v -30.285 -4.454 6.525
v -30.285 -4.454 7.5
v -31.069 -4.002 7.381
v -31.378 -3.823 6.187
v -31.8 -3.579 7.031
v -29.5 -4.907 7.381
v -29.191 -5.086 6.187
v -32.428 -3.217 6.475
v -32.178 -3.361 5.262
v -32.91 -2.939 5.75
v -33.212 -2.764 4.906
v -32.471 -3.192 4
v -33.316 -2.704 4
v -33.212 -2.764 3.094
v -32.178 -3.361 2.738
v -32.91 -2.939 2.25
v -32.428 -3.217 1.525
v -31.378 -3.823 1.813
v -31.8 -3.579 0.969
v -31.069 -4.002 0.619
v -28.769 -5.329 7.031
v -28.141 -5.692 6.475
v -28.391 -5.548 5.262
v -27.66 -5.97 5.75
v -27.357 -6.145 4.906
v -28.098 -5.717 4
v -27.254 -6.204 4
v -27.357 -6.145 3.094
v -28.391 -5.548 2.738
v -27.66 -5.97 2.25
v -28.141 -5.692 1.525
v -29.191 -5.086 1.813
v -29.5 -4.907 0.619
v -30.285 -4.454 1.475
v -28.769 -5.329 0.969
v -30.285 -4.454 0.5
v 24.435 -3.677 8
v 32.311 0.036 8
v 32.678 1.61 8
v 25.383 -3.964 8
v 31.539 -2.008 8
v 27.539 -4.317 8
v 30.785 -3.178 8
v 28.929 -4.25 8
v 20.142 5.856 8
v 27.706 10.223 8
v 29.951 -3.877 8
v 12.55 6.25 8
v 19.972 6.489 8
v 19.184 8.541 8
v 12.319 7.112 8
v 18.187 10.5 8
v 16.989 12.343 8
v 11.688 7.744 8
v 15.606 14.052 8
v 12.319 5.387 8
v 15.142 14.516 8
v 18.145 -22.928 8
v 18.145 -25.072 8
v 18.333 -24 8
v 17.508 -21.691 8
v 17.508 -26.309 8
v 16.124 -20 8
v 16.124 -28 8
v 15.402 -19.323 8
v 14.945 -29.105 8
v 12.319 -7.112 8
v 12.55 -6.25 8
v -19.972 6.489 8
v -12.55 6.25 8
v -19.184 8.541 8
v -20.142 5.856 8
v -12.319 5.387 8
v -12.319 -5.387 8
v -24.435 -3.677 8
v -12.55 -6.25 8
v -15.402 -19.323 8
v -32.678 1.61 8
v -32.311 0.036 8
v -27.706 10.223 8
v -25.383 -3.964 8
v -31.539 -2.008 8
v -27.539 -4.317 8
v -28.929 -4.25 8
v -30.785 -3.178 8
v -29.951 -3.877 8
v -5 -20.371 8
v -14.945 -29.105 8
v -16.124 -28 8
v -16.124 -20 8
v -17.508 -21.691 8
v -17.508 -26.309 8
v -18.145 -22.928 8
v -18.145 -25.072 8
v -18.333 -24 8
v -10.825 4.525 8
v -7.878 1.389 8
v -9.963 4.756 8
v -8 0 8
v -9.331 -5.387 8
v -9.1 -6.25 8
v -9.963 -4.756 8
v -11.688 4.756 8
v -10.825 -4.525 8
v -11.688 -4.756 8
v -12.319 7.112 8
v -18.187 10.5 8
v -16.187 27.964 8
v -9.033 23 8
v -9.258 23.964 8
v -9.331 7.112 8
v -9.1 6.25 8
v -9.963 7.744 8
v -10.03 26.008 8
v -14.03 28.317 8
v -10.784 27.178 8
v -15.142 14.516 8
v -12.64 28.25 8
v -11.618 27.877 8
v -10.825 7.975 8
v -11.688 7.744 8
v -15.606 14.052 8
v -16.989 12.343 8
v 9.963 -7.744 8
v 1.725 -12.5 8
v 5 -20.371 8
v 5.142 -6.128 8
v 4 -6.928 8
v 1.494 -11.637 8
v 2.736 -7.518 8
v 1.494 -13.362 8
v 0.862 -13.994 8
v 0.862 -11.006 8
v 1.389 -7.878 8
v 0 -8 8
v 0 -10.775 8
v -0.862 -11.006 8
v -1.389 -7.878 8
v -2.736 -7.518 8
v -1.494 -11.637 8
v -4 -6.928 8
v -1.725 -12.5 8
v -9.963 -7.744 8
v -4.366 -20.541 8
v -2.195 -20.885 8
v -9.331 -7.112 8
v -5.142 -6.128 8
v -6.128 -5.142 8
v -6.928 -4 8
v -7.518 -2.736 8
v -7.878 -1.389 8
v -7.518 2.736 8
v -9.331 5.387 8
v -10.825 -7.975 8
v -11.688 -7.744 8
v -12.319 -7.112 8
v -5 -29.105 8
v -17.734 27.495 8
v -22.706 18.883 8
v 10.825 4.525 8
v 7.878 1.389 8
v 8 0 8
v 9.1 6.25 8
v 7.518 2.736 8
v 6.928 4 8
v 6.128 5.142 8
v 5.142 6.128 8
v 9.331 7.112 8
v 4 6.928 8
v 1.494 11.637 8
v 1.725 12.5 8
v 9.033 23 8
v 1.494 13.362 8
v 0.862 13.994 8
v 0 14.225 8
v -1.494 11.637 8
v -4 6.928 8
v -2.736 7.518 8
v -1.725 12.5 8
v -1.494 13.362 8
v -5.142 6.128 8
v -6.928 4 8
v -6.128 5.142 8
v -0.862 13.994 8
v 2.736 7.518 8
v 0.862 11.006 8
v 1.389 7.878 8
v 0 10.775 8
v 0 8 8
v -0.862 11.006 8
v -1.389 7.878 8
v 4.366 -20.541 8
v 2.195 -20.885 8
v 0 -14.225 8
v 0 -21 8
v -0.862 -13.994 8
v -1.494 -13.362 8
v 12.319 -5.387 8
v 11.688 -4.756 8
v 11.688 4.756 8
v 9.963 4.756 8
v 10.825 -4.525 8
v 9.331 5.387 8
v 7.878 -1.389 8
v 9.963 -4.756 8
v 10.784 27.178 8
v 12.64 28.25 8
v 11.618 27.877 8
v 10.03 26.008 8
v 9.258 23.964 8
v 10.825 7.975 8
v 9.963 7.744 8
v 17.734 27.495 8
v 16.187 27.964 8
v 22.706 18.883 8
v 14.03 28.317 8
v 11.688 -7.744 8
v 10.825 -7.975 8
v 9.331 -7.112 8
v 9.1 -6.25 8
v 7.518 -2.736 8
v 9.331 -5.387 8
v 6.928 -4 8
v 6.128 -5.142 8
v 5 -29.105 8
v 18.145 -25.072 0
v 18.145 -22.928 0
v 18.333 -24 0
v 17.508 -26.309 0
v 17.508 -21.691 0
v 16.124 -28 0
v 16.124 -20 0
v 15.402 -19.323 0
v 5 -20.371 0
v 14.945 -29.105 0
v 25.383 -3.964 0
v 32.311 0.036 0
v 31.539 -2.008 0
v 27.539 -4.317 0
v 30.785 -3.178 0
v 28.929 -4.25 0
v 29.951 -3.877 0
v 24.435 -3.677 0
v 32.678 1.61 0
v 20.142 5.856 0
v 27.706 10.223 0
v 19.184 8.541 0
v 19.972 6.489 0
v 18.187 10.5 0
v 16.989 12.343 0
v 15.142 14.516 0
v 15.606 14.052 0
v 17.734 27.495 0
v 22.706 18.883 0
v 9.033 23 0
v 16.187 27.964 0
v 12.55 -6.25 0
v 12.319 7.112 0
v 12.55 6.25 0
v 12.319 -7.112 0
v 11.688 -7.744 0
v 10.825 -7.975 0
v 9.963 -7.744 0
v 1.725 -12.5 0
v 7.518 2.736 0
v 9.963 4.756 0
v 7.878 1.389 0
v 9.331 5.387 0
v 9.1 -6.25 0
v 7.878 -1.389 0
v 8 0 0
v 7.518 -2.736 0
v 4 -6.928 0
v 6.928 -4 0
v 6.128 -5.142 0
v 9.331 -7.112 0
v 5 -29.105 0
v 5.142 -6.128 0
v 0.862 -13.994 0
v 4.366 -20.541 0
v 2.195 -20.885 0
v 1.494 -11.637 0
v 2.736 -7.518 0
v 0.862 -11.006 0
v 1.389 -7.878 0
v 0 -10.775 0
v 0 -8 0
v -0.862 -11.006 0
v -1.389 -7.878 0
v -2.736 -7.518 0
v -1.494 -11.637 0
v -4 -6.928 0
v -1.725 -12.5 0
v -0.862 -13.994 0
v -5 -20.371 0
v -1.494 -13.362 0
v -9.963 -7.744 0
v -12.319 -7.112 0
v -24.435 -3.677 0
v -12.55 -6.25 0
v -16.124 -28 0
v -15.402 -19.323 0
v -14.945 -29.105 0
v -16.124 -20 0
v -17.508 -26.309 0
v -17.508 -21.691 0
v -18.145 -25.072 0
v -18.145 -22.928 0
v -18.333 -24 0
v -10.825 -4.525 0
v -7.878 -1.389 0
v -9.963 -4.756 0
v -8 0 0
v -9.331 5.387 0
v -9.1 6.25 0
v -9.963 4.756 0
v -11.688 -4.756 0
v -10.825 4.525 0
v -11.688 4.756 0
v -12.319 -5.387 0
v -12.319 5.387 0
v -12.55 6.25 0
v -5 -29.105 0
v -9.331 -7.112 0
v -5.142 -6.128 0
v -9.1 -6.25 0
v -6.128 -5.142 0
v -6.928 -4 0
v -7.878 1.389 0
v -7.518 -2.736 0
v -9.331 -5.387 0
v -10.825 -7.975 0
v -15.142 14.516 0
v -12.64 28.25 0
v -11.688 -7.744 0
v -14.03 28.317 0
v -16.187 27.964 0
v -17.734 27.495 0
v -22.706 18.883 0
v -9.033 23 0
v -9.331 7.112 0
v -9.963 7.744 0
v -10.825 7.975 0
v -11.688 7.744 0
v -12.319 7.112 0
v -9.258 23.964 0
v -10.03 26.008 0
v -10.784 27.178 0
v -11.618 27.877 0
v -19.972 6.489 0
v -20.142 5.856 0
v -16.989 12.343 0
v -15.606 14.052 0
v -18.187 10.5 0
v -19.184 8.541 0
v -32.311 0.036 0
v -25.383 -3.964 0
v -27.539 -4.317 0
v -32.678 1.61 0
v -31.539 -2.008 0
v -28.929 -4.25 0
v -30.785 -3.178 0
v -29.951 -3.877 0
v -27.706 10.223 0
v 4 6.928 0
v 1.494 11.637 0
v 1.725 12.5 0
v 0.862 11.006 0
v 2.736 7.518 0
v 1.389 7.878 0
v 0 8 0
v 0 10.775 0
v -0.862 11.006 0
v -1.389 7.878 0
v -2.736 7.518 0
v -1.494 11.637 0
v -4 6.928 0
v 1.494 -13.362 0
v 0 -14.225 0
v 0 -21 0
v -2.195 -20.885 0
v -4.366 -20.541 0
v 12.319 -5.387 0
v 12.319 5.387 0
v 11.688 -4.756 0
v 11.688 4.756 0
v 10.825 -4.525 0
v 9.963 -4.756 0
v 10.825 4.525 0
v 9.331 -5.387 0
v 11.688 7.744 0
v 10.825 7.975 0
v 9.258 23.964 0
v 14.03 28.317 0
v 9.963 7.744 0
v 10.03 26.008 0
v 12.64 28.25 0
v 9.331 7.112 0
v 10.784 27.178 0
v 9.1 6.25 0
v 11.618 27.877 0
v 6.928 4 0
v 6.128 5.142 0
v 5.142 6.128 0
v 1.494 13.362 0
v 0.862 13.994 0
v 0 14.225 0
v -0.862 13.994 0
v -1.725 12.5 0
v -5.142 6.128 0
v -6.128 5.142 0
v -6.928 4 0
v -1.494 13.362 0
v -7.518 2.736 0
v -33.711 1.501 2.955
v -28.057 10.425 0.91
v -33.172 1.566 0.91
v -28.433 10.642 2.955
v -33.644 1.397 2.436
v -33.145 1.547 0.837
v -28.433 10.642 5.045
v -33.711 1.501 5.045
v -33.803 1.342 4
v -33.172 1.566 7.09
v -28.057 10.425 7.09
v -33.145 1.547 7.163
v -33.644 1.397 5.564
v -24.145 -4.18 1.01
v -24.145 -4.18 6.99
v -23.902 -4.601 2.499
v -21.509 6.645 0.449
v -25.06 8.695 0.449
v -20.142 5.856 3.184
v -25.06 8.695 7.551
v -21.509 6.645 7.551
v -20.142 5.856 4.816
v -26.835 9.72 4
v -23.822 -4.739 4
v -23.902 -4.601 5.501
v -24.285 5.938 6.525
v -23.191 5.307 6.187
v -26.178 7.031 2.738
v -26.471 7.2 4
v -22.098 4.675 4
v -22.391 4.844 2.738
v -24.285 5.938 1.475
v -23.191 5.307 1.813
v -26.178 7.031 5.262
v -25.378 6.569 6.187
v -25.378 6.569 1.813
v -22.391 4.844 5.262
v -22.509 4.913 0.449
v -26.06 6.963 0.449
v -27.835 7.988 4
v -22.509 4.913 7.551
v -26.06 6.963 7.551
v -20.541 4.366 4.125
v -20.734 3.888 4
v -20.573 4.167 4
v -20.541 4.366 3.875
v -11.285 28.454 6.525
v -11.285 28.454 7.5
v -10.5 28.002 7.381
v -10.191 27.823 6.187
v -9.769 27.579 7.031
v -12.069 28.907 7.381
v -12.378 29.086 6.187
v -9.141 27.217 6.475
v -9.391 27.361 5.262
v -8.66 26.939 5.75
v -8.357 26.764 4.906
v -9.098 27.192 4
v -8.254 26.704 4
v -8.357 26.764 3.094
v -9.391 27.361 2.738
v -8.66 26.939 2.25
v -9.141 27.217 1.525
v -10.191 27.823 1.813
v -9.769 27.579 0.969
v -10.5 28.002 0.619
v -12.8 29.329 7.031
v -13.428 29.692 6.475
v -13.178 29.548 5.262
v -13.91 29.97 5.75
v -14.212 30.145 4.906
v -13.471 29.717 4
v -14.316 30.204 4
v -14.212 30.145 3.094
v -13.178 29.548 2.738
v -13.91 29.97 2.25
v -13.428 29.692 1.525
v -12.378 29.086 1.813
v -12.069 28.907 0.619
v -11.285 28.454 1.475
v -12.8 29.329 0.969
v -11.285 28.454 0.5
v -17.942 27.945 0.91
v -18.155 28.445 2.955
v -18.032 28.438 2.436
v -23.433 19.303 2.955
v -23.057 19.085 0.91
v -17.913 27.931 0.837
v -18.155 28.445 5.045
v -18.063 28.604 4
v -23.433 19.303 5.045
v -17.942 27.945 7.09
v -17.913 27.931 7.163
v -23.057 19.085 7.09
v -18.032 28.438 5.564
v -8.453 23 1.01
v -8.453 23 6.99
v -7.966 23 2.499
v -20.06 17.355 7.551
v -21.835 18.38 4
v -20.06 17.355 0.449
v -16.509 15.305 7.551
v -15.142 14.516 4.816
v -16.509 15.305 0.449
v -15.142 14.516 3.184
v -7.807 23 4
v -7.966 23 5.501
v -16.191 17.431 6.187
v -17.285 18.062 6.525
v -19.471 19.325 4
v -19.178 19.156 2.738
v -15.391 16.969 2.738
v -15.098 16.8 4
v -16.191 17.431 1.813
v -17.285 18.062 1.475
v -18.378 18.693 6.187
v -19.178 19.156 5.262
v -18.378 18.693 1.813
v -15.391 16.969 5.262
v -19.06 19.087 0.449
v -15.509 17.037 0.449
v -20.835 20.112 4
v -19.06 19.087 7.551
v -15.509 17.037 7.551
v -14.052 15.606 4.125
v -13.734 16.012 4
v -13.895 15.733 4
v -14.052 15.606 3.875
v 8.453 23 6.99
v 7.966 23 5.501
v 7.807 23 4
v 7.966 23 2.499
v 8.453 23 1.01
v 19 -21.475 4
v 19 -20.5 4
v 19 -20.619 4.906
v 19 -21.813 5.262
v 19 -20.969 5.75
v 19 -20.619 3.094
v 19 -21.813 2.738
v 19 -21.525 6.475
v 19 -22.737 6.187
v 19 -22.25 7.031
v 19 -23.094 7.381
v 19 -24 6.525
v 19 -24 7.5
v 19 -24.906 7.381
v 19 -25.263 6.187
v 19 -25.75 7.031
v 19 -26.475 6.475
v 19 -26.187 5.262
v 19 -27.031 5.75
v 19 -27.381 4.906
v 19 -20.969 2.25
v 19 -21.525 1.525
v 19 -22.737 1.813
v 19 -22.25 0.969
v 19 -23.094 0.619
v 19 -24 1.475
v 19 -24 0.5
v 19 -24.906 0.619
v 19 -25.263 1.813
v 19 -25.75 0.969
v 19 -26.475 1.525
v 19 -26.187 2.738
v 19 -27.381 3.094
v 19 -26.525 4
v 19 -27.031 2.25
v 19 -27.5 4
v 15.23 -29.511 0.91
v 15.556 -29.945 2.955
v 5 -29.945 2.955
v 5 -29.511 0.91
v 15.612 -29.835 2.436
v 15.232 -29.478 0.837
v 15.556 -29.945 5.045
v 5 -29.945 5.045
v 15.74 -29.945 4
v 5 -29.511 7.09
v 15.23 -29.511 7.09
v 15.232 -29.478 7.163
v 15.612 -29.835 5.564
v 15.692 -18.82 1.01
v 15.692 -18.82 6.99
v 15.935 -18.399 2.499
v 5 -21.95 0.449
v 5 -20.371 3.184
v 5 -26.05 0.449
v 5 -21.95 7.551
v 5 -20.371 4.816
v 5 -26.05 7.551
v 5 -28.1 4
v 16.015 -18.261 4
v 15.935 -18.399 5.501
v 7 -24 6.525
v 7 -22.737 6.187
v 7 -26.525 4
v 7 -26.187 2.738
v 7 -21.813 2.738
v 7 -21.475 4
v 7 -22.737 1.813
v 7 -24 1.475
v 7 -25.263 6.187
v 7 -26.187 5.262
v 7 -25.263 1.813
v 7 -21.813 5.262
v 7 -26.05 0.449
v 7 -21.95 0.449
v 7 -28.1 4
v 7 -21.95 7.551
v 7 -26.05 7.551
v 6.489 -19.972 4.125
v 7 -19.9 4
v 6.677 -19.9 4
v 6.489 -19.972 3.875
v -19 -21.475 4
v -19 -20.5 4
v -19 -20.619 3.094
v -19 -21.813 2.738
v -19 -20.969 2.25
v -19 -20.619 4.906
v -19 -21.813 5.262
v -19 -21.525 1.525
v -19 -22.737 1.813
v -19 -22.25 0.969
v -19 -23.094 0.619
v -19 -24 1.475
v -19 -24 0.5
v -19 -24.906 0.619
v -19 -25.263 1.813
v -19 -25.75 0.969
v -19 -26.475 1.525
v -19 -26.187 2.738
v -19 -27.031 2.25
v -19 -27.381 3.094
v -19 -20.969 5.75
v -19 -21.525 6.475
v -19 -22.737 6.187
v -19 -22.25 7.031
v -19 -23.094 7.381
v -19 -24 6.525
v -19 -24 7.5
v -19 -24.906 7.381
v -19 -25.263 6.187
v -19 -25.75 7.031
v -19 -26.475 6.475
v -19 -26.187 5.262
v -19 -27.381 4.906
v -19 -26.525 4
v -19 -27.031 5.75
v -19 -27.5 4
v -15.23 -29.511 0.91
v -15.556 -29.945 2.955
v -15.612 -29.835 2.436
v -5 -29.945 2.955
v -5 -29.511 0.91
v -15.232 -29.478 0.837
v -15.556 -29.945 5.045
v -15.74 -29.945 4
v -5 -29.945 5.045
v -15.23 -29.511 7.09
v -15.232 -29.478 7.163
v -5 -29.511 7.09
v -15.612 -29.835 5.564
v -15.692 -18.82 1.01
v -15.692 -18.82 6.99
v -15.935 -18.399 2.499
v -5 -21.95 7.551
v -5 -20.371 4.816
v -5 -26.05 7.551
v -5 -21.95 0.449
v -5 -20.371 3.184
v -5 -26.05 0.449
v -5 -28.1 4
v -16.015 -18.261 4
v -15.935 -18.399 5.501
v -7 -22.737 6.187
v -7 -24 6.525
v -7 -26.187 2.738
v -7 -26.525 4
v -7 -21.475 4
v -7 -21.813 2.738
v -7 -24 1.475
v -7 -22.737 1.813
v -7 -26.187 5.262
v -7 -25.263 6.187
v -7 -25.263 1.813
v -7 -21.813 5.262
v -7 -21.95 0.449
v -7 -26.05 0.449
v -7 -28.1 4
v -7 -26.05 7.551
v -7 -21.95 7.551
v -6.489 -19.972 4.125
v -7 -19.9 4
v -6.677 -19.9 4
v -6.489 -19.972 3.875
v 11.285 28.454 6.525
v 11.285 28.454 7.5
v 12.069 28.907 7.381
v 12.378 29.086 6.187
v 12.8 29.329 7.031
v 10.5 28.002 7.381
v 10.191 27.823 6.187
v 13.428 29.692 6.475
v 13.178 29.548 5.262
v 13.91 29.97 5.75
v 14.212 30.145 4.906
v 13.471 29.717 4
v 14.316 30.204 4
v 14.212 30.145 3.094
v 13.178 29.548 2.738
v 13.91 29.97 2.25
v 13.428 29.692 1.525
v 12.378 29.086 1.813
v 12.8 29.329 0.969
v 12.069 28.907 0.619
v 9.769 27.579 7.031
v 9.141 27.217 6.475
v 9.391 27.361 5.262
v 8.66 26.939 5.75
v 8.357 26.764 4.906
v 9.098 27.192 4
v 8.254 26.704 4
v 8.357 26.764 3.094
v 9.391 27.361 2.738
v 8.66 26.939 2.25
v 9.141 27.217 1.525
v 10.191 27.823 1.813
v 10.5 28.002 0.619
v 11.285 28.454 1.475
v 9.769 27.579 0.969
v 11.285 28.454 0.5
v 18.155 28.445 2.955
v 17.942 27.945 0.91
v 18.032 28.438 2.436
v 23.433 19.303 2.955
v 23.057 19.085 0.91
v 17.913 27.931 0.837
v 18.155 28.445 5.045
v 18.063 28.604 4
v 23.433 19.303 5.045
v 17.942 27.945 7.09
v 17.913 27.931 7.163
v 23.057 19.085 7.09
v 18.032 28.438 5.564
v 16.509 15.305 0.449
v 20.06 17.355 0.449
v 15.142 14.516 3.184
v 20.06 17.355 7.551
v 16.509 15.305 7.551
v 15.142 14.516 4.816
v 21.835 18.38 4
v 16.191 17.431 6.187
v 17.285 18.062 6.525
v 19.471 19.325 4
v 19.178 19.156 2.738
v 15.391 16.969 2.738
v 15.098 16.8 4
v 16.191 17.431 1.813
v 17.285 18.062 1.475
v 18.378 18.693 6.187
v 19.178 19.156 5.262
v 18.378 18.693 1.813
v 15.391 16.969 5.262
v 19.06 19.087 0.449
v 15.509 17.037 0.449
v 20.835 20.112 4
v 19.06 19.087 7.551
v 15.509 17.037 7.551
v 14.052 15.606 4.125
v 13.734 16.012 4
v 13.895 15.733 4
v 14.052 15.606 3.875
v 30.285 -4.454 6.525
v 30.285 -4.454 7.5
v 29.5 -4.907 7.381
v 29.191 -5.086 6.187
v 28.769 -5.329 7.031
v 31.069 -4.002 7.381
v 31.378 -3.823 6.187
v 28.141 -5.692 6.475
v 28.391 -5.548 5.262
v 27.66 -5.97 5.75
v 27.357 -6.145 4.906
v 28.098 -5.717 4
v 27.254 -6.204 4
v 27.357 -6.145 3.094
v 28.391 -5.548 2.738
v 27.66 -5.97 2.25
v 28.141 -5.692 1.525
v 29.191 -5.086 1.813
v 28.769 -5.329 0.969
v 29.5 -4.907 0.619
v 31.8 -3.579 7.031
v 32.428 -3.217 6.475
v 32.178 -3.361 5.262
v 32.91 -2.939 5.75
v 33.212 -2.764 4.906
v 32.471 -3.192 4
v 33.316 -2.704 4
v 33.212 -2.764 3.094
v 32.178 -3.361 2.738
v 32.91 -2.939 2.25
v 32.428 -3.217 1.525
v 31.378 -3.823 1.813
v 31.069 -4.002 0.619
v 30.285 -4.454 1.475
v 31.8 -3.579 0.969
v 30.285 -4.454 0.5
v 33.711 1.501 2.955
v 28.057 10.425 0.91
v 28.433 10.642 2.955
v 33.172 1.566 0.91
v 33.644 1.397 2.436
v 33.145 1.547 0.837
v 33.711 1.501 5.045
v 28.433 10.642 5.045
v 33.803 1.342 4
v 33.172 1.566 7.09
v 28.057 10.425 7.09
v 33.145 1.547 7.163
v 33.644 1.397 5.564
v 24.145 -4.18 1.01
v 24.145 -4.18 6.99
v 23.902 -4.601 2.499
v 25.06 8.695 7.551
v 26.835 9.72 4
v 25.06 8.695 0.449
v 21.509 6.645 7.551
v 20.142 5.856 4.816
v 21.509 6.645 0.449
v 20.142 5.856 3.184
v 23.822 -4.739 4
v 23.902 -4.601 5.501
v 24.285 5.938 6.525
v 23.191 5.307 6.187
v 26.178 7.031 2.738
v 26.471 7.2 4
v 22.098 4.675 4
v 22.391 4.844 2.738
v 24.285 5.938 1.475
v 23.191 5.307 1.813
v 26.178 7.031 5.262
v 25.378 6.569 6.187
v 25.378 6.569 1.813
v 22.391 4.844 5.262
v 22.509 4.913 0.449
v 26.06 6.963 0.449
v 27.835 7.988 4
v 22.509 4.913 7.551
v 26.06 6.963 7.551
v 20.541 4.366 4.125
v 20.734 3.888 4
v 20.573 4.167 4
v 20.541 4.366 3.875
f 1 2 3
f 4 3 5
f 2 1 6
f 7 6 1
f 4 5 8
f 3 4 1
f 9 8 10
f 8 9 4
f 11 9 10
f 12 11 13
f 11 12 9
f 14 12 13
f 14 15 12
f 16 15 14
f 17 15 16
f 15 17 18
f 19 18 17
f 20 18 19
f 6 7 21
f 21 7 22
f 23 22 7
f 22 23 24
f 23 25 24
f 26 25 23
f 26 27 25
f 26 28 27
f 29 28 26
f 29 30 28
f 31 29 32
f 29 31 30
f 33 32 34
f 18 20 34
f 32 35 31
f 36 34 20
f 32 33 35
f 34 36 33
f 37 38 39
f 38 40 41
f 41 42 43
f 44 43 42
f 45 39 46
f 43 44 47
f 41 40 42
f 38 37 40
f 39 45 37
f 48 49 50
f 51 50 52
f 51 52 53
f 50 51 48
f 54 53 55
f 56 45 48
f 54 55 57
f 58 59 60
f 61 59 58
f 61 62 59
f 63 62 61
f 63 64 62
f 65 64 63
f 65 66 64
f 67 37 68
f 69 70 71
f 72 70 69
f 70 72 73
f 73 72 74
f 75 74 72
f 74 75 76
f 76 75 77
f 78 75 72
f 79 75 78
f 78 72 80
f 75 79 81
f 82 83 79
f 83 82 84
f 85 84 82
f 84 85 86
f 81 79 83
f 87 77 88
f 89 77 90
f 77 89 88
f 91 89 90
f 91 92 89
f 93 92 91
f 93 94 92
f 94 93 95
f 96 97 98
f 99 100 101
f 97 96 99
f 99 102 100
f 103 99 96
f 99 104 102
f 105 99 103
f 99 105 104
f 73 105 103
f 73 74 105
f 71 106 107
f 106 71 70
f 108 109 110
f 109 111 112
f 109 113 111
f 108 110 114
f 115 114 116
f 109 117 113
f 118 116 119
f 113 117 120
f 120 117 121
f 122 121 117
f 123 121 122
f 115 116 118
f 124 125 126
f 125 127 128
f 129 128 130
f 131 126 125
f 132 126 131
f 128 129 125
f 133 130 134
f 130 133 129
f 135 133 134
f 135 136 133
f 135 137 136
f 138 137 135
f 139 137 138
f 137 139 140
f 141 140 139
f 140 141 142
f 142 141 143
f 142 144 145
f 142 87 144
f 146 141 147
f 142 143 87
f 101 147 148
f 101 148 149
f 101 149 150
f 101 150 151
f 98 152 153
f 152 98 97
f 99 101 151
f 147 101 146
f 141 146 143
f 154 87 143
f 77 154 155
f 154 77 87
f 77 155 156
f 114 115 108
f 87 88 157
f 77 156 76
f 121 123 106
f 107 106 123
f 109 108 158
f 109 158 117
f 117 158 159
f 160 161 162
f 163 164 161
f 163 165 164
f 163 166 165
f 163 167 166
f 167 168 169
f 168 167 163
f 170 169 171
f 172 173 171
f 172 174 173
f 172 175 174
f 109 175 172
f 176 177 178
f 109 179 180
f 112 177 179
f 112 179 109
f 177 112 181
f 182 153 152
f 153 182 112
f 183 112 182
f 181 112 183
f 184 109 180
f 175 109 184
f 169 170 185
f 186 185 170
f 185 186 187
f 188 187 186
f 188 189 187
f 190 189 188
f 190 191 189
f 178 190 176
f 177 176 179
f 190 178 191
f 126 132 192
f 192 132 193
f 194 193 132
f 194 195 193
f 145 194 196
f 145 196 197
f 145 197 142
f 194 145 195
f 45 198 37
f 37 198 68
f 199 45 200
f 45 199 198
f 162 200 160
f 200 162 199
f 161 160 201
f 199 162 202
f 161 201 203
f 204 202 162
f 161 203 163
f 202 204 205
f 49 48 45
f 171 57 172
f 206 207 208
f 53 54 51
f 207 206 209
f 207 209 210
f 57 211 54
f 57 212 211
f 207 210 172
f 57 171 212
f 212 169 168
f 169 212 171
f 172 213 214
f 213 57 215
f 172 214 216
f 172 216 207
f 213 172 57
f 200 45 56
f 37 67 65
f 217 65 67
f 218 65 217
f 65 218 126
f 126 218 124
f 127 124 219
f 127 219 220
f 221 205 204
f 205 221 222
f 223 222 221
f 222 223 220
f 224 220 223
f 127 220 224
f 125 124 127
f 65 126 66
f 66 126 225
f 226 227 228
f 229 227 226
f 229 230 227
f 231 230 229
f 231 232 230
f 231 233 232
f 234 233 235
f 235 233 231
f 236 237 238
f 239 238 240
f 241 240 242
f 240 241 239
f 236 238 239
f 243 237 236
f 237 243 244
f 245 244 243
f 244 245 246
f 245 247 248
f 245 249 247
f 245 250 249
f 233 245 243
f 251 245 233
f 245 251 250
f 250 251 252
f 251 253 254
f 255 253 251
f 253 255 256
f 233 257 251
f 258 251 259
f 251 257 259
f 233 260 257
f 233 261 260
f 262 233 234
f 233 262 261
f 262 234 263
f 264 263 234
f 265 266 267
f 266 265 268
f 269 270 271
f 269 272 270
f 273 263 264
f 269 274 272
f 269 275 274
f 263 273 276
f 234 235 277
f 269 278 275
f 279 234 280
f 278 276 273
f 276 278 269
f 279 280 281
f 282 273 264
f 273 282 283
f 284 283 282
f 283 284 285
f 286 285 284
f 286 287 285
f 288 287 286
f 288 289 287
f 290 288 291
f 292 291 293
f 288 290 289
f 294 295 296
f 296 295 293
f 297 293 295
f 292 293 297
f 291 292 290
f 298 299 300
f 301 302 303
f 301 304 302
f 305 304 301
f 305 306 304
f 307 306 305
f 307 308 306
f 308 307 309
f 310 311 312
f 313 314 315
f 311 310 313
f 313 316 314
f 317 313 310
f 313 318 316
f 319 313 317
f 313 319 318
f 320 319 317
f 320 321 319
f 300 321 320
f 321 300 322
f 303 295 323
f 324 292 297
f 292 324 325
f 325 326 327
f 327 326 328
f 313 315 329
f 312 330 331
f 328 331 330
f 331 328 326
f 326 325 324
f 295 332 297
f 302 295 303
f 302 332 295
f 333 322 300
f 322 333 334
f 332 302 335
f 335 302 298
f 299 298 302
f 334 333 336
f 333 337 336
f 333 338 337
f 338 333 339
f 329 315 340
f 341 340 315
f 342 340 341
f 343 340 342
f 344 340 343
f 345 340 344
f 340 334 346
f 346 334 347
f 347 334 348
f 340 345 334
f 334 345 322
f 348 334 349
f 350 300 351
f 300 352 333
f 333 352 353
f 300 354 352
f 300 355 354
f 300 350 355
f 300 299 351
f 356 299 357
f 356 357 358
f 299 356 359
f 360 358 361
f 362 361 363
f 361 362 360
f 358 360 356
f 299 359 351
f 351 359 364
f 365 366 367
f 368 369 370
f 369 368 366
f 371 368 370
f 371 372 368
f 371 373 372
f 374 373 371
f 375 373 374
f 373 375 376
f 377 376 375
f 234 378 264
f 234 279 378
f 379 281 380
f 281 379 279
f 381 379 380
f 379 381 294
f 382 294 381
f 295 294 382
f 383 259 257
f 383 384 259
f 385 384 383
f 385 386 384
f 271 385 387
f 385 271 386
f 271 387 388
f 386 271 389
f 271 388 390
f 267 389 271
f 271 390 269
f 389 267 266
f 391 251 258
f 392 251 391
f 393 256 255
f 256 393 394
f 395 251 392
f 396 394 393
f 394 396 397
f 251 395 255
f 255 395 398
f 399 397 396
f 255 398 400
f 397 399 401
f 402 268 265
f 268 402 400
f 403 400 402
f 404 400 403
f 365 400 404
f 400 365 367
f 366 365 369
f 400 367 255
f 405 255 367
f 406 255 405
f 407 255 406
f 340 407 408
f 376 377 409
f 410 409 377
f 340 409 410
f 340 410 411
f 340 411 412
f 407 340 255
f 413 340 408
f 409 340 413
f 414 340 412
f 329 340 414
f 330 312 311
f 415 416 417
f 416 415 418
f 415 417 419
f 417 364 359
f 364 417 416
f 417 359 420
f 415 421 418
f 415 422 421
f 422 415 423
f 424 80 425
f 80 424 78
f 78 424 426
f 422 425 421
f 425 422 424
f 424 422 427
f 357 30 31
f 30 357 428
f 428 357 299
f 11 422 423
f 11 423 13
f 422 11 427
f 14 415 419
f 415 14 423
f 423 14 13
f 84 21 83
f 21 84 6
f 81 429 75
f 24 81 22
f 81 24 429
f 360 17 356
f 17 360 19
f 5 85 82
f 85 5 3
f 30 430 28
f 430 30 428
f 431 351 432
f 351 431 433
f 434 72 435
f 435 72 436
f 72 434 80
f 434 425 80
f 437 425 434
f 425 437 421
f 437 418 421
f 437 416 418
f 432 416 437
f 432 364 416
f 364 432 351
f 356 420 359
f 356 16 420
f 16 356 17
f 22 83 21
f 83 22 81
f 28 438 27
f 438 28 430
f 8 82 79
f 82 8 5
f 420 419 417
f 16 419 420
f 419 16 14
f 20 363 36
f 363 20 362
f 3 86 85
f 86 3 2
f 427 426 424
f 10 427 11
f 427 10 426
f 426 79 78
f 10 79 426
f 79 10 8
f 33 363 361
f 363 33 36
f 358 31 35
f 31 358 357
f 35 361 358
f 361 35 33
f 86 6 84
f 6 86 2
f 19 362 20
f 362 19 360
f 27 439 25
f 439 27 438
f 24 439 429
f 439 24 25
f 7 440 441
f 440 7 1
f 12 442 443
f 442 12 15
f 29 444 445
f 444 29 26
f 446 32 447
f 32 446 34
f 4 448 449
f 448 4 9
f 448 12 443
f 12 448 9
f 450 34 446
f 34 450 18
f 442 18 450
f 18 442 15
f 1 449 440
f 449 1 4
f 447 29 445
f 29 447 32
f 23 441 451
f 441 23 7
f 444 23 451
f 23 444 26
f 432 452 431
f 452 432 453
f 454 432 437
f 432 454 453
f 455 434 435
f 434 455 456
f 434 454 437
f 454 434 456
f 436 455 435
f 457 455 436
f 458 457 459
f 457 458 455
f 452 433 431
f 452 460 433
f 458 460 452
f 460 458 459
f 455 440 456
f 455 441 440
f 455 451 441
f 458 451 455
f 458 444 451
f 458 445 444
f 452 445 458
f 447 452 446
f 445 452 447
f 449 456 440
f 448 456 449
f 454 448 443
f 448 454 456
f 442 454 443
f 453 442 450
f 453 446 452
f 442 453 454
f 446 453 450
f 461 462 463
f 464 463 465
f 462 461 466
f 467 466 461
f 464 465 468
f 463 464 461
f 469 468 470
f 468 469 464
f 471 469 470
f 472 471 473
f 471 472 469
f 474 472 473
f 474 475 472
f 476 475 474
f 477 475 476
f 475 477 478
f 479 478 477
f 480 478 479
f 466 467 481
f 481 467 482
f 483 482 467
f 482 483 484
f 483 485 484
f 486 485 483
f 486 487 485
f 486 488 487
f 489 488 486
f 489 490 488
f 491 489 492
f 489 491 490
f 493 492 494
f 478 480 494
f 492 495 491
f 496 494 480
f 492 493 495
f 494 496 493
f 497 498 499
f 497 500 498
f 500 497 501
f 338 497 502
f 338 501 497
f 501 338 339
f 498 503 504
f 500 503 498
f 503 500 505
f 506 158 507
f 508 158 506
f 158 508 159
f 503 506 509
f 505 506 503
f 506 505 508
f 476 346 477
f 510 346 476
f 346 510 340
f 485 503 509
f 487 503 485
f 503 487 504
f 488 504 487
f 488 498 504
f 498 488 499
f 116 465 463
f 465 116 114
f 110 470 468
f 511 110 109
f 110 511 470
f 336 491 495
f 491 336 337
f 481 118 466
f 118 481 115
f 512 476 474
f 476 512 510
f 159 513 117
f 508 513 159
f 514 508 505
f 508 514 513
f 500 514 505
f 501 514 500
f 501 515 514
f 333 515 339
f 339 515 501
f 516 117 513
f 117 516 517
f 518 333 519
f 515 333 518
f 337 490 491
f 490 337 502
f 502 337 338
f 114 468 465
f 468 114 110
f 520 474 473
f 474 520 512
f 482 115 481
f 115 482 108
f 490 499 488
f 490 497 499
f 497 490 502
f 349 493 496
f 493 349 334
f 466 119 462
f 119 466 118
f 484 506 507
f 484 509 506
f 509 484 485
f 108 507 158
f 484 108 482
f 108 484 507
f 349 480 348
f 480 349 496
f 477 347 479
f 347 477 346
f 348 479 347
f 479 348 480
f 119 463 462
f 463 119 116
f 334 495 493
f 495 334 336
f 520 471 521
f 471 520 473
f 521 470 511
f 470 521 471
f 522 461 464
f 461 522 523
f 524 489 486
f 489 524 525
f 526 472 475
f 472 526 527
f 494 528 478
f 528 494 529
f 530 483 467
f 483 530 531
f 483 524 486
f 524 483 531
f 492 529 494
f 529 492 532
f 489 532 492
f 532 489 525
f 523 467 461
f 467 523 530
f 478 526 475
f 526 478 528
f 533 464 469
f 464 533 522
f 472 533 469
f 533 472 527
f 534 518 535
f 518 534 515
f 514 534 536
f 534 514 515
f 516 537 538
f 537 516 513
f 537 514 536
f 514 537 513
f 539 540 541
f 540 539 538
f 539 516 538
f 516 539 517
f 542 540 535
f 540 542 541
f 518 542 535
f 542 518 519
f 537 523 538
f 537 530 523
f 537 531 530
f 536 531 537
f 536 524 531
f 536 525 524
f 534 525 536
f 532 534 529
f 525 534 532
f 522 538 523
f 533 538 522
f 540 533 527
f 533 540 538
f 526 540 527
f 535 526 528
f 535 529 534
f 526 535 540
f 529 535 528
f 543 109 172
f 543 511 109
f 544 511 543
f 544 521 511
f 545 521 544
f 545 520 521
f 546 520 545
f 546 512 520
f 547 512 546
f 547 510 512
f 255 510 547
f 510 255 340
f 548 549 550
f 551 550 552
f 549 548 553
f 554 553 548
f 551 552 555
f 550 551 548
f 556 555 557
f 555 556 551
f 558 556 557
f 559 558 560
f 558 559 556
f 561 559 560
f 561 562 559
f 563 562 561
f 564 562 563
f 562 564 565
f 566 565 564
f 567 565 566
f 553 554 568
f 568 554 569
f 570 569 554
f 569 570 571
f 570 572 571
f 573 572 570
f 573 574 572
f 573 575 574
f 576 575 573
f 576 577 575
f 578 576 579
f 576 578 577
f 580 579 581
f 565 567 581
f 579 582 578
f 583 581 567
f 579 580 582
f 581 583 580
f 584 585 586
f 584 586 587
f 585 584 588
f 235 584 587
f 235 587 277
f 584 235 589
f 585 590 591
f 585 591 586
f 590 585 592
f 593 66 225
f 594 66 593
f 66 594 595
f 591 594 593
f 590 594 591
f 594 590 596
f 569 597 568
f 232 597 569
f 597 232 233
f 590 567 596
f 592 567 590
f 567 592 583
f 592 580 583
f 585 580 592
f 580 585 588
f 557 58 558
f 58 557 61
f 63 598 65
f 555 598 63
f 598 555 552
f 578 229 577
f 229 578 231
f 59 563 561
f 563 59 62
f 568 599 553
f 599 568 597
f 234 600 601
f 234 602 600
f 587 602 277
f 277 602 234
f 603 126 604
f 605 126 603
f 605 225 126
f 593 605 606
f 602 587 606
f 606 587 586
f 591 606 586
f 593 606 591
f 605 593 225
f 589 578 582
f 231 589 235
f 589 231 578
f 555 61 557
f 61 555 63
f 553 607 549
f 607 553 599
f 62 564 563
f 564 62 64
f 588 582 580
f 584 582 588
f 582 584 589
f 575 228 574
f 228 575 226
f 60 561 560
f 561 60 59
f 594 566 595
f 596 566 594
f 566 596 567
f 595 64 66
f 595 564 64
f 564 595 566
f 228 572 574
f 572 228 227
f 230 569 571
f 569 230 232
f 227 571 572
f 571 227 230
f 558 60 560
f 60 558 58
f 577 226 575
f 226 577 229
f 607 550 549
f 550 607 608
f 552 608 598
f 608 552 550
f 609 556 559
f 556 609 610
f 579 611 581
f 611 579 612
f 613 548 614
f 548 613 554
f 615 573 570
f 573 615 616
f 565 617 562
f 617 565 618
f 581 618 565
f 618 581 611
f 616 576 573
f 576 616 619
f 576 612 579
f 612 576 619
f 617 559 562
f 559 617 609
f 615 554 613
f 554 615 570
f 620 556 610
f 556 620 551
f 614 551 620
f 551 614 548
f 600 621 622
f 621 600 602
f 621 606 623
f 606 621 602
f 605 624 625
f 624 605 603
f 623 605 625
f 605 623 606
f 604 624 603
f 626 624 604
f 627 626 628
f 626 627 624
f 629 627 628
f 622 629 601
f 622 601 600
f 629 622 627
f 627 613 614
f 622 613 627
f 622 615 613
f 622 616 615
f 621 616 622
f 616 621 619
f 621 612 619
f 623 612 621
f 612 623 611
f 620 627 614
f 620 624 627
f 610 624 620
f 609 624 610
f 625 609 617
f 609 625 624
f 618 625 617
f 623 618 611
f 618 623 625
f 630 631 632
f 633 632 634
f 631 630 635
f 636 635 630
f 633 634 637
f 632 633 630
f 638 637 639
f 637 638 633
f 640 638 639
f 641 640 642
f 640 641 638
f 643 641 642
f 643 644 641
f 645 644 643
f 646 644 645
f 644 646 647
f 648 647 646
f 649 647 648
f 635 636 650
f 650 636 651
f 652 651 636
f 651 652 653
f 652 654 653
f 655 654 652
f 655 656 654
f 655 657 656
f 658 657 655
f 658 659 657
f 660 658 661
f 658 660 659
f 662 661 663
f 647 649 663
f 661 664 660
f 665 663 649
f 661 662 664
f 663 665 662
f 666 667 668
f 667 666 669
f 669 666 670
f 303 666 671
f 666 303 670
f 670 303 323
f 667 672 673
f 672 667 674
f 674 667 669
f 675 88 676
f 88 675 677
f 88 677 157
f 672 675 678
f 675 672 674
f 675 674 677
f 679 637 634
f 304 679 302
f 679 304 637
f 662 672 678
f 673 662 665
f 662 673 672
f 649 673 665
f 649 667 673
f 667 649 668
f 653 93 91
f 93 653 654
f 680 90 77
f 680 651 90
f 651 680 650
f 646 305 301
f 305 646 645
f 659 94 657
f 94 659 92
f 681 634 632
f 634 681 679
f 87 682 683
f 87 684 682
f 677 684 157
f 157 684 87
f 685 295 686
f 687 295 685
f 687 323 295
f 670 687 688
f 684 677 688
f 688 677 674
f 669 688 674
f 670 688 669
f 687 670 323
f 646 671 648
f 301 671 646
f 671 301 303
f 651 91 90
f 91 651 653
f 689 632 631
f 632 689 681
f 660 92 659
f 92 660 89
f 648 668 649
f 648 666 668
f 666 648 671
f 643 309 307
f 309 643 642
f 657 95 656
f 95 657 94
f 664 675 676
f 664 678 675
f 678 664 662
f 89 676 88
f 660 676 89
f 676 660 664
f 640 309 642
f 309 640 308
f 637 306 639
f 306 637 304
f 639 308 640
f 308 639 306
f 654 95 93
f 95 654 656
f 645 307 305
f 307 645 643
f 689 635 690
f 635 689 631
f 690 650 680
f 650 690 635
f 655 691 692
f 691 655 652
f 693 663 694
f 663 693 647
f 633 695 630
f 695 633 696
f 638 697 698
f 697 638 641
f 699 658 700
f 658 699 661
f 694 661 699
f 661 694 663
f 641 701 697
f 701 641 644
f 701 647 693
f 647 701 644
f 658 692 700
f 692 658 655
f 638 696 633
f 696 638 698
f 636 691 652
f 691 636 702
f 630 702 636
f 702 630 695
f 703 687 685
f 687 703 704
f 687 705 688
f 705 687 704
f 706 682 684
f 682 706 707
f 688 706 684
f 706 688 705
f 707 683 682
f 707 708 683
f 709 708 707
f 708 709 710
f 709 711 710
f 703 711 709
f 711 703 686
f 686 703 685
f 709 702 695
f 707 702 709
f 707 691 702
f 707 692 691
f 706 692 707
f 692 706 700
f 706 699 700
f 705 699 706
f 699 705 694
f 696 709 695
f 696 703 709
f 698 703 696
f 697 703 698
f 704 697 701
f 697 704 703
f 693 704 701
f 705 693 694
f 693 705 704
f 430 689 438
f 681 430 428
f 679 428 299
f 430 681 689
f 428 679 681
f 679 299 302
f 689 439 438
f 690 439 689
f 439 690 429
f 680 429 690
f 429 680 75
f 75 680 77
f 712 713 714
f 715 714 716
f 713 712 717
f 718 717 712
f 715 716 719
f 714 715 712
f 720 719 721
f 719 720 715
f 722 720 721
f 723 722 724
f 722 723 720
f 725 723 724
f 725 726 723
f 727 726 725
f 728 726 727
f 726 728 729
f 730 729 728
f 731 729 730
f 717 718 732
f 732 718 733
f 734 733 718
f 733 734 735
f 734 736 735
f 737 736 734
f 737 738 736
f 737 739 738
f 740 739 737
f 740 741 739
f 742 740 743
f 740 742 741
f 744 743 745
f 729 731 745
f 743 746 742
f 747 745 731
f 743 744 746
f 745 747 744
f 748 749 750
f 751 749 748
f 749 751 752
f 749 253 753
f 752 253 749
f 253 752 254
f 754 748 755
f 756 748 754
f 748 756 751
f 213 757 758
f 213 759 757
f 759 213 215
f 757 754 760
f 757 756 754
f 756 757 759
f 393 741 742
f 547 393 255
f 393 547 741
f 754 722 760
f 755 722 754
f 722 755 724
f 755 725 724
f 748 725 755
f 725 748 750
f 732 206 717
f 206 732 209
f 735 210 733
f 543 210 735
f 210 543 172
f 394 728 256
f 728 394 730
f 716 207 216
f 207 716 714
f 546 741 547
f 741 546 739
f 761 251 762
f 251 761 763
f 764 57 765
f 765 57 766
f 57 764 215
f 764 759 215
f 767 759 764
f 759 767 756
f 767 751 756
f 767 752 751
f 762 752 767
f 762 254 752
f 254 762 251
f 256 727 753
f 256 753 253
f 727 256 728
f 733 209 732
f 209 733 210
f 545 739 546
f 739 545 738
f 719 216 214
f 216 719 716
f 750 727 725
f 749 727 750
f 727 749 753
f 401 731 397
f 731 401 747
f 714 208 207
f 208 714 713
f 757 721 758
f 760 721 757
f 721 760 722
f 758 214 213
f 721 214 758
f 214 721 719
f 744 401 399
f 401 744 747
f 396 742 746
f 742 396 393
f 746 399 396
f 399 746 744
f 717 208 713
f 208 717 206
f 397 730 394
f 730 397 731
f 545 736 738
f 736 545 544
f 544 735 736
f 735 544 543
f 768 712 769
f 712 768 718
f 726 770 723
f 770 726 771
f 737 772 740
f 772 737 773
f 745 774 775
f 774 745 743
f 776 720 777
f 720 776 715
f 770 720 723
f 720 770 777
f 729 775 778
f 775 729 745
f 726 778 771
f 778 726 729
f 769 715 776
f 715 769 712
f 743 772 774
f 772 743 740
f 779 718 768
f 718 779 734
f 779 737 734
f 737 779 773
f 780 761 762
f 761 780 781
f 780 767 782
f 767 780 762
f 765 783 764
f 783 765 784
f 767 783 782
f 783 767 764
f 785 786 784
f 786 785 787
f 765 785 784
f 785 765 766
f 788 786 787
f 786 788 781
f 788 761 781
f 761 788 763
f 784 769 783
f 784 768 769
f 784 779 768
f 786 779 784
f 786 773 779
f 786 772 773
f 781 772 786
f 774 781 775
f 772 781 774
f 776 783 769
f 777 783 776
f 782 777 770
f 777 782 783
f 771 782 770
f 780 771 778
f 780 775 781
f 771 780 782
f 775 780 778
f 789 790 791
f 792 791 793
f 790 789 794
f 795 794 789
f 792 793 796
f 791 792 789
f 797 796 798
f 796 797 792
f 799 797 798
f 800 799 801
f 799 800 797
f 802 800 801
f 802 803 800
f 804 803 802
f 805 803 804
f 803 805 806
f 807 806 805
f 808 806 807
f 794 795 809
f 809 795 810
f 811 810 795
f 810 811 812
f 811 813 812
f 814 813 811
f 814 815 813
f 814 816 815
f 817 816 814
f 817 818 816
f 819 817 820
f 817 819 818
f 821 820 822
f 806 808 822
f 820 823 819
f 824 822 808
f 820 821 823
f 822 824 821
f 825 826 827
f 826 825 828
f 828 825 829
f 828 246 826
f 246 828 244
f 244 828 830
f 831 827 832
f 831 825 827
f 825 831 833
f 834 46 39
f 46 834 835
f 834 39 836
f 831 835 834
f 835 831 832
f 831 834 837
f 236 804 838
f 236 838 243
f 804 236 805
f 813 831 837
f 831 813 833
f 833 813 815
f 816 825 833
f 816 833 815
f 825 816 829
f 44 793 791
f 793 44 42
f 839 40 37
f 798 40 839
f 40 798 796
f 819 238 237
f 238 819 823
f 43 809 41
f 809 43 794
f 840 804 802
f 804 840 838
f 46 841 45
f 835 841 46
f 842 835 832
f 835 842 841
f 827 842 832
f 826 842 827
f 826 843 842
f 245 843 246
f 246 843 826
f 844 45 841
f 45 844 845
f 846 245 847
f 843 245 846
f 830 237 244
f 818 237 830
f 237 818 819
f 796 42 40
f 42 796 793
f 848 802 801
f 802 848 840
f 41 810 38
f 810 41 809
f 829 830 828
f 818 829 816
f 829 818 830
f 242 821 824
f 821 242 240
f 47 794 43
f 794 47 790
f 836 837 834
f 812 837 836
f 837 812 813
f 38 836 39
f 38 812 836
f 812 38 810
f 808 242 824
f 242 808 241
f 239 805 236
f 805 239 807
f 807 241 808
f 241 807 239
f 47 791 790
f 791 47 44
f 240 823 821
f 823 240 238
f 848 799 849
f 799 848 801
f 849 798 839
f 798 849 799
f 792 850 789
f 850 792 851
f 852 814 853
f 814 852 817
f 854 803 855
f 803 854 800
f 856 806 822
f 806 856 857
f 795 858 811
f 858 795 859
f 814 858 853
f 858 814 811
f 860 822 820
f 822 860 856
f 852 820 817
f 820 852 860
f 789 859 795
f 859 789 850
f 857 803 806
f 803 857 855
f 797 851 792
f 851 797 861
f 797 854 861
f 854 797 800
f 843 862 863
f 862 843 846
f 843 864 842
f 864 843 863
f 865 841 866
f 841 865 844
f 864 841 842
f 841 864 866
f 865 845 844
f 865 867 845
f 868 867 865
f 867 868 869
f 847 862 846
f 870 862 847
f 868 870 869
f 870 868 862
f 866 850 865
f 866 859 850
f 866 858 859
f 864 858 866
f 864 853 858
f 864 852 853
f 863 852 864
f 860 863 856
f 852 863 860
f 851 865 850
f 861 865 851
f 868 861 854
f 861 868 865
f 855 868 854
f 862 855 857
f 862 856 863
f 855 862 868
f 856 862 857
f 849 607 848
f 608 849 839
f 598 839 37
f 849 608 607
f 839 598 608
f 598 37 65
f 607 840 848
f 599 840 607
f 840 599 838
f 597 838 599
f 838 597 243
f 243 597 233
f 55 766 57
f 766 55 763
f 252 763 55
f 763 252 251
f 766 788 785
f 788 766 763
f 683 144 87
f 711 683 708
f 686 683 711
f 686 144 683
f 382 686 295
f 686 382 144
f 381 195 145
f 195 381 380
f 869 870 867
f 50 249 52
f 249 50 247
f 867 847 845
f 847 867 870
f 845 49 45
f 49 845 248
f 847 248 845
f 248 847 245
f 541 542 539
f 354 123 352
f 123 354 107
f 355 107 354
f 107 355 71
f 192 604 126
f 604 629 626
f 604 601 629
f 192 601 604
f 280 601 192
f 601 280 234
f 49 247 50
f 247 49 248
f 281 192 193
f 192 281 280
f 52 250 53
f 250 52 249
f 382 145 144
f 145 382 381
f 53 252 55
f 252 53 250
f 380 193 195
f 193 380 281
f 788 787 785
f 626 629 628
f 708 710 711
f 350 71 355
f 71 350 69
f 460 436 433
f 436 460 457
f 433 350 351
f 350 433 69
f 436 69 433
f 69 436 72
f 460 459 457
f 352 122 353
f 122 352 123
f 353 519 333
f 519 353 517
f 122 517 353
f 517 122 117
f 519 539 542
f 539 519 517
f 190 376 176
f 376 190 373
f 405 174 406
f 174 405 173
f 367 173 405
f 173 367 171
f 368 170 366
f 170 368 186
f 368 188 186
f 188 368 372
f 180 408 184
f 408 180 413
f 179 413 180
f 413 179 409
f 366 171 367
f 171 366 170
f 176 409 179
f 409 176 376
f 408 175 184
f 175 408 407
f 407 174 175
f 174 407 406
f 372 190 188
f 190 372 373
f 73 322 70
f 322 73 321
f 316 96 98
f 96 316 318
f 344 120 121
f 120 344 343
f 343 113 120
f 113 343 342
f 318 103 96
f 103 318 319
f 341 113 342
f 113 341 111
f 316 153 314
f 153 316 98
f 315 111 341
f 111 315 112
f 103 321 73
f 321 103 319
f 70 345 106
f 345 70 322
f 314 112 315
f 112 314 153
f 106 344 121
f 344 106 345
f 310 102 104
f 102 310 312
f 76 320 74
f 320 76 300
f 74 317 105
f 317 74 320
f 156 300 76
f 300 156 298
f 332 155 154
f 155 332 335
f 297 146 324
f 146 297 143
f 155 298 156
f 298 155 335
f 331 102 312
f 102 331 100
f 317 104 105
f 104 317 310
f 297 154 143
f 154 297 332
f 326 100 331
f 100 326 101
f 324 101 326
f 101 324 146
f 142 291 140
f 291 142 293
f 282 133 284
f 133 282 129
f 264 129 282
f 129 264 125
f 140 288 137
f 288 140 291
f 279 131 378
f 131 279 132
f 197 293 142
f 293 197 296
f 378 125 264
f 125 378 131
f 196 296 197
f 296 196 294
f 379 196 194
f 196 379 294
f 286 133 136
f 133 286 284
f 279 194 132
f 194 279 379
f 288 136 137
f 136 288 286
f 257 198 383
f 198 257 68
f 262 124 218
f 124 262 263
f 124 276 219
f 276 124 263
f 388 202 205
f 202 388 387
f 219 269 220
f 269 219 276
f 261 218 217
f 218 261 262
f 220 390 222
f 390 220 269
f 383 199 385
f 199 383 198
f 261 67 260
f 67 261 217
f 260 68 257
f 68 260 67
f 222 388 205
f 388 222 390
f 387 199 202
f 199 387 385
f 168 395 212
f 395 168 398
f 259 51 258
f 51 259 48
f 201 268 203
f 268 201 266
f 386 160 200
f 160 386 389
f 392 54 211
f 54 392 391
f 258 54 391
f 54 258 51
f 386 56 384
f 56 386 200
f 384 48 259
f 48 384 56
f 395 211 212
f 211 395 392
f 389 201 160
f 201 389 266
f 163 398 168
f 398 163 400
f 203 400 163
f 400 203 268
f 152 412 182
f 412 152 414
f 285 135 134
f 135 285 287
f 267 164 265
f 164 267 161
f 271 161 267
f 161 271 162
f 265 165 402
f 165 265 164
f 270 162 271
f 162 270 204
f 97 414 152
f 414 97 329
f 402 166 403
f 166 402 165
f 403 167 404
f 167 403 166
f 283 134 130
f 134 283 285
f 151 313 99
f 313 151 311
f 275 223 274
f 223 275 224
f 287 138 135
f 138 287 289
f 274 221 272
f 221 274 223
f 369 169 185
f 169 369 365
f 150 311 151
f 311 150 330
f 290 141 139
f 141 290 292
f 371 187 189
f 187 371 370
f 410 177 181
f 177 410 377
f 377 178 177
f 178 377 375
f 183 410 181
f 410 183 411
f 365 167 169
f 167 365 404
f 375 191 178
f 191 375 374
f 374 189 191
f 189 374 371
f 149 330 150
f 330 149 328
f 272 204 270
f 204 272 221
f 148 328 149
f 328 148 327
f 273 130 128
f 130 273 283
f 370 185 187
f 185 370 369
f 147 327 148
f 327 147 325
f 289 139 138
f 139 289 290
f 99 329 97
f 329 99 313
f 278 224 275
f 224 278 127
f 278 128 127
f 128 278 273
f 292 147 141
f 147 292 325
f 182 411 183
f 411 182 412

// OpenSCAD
// file: configuration.scad
// Increase this if your slicer or printer make holes too tight.
extra_radius = 0.1;

// OD = outside diameter, corner to corner.
m3_nut_od = 6.1;
m3_nut_radius = m3_nut_od/2 + 0.2 + extra_radius;
m3_washer_radius = 3.5 + extra_radius;

m4_nut_od = 7.6;
m4_nut_radius = m4_nut_od/2 + 0.2 + extra_radius;
m4_washer_radius = 4.4 + extra_radius;

// Major diameter of metric 3mm thread.
m3_major = 2.85;
m3_radius = m3_major/2 + extra_radius;
m3_wide_radius = m3_major/2 + extra_radius + 0.2;

// Major diameter of metric 4mm thread.
m4_major = 4.85;
m4_radius = m4_major/2 + extra_radius;
m4_wide_radius = m4_major/2 + extra_radius + 0.2;


// NEMA17 stepper motors.
motor_shaft_diameter = 5;
motor_shaft_radius = motor_shaft_diameter/2 + extra_radius;

// Frame brackets. M3x8mm screws work best with 3.6 mm brackets.
thickness = 3.6;

// OpenBeam or Misumi. Currently only 15x15 mm, but there is a plan
// to make models more parametric and allow 20x20 mm in the future.
extrusion = 20;

// Placement for the NEMA17 stepper motors.
motor_offset = 44;
motor_length = 47;
// main file
include <configuration.scad>;

separation = 38;  // Distance between ball joint mounting faces.
offset = 24;  // Same as DELTA_EFFECTOR_OFFSET in Marlin.
mount_radius = 12.5;  // Hotend mounting screws, standard would be 25mm.
hotend_radius = 8;  // Hole for the hotend (J-Head diameter is 16mm).
push_fit_height = 4;  // Length of brass threaded into printed plastic.
height = 8;
cone_r1 = 3.5;
cone_r2 = 14;

// The size of the nuts and bolts holding the spider arms
bolt_radius = m4_radius;
nut_radius = m4_nut_radius;


module effector() {
  difference() {
    union() {
      cylinder(r=offset-3, h=height, center=true, $fn=60);
      for (a = [60:120:359]) rotate([0, 0, a]) {
	rotate([0, 0, 30]) translate([offset-6, 0, 0])
	  cube([10, 19, height], center=true);
	for (s = [-1, 1]) scale([s, 1, 1]) {
	  translate([0, offset, 0]) difference() {
	    intersection() {
	      cube([separation, 40, height], center=true);
	      translate([0, -4, 0]) rotate([0, 90, 0])
		cylinder(r=10, h=separation, center=true);
	      translate([separation/2-7, 0, 0]) rotate([0, 90, 0])
		cylinder(r1=cone_r2, r2=cone_r1, h=14, center=true, $fn=24);
	    }
	    rotate([0, 90, 0])
	      cylinder(r=bolt_radius, h=separation+1, center=true, $fn=12);
	    rotate([90, 0, 90])
	      cylinder(r=nut_radius, h=separation-24, center=true, $fn=6);
	  }
        }
      }
    }
    //translate([0, 0, push_fit_height-height/2])
    translate([0,0,-height])
      cylinder(r=hotend_radius, h=height*2, $fn=36);
    //translate([0, 0, -6]) # import("m5_internal.stl");
    for (a = [0:60:359]) rotate([0, 0, a]) {
      translate([0, mount_radius, 0])
	cylinder(r=m3_wide_radius, h=2*height, center=true, $fn=12);
    }
  }
}

translate([0, 0, height/2]) effector();
